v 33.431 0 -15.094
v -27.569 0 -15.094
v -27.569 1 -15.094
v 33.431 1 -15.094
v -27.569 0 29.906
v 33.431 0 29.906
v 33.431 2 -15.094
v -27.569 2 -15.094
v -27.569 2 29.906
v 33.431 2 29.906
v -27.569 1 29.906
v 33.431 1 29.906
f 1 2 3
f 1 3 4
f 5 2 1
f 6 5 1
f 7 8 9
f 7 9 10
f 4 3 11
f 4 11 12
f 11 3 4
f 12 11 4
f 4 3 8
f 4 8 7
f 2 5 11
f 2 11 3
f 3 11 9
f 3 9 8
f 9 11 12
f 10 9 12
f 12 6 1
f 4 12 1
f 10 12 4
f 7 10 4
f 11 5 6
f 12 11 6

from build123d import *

# Parameters (mm, degrees)
SKETCH1_W           = 61
SKETCH1_H           = 45
BOSS_EXTRUDE1_DEPTH = 1
BOSS_EXTRUDE3_START = 1
SKETCH1_3_W         = 61
SKETCH1_3_H         = 45
BOSS_EXTRUDE3_DEPTH = 1


with BuildPart() as part:
    # Sketch1 → Boss-Extrude1 (new body)
    with BuildSketch(Plane(origin=(0, 0, 0), x_dir=(1, 0, 0), z_dir=(0, 1, 0))):
        with Locations((2.931492843, -7.40593047)):
            Rectangle(SKETCH1_W, SKETCH1_H)
    extrude(amount=BOSS_EXTRUDE1_DEPTH)


with BuildPart() as body_2:
    # Sketch1<3> → Boss-Extrude3 (new body)
    with BuildSketch(Plane(origin=(0, 0, 0), x_dir=(1, 0, 0), z_dir=(0, 1, 0)).offset(BOSS_EXTRUDE3_START)):
        with Locations((2.931492843, -7.40593047)):
            Rectangle(SKETCH1_3_W, SKETCH1_3_H)
    extrude(amount=BOSS_EXTRUDE3_DEPTH)


solid = Compound([part.part, body_2.part])
